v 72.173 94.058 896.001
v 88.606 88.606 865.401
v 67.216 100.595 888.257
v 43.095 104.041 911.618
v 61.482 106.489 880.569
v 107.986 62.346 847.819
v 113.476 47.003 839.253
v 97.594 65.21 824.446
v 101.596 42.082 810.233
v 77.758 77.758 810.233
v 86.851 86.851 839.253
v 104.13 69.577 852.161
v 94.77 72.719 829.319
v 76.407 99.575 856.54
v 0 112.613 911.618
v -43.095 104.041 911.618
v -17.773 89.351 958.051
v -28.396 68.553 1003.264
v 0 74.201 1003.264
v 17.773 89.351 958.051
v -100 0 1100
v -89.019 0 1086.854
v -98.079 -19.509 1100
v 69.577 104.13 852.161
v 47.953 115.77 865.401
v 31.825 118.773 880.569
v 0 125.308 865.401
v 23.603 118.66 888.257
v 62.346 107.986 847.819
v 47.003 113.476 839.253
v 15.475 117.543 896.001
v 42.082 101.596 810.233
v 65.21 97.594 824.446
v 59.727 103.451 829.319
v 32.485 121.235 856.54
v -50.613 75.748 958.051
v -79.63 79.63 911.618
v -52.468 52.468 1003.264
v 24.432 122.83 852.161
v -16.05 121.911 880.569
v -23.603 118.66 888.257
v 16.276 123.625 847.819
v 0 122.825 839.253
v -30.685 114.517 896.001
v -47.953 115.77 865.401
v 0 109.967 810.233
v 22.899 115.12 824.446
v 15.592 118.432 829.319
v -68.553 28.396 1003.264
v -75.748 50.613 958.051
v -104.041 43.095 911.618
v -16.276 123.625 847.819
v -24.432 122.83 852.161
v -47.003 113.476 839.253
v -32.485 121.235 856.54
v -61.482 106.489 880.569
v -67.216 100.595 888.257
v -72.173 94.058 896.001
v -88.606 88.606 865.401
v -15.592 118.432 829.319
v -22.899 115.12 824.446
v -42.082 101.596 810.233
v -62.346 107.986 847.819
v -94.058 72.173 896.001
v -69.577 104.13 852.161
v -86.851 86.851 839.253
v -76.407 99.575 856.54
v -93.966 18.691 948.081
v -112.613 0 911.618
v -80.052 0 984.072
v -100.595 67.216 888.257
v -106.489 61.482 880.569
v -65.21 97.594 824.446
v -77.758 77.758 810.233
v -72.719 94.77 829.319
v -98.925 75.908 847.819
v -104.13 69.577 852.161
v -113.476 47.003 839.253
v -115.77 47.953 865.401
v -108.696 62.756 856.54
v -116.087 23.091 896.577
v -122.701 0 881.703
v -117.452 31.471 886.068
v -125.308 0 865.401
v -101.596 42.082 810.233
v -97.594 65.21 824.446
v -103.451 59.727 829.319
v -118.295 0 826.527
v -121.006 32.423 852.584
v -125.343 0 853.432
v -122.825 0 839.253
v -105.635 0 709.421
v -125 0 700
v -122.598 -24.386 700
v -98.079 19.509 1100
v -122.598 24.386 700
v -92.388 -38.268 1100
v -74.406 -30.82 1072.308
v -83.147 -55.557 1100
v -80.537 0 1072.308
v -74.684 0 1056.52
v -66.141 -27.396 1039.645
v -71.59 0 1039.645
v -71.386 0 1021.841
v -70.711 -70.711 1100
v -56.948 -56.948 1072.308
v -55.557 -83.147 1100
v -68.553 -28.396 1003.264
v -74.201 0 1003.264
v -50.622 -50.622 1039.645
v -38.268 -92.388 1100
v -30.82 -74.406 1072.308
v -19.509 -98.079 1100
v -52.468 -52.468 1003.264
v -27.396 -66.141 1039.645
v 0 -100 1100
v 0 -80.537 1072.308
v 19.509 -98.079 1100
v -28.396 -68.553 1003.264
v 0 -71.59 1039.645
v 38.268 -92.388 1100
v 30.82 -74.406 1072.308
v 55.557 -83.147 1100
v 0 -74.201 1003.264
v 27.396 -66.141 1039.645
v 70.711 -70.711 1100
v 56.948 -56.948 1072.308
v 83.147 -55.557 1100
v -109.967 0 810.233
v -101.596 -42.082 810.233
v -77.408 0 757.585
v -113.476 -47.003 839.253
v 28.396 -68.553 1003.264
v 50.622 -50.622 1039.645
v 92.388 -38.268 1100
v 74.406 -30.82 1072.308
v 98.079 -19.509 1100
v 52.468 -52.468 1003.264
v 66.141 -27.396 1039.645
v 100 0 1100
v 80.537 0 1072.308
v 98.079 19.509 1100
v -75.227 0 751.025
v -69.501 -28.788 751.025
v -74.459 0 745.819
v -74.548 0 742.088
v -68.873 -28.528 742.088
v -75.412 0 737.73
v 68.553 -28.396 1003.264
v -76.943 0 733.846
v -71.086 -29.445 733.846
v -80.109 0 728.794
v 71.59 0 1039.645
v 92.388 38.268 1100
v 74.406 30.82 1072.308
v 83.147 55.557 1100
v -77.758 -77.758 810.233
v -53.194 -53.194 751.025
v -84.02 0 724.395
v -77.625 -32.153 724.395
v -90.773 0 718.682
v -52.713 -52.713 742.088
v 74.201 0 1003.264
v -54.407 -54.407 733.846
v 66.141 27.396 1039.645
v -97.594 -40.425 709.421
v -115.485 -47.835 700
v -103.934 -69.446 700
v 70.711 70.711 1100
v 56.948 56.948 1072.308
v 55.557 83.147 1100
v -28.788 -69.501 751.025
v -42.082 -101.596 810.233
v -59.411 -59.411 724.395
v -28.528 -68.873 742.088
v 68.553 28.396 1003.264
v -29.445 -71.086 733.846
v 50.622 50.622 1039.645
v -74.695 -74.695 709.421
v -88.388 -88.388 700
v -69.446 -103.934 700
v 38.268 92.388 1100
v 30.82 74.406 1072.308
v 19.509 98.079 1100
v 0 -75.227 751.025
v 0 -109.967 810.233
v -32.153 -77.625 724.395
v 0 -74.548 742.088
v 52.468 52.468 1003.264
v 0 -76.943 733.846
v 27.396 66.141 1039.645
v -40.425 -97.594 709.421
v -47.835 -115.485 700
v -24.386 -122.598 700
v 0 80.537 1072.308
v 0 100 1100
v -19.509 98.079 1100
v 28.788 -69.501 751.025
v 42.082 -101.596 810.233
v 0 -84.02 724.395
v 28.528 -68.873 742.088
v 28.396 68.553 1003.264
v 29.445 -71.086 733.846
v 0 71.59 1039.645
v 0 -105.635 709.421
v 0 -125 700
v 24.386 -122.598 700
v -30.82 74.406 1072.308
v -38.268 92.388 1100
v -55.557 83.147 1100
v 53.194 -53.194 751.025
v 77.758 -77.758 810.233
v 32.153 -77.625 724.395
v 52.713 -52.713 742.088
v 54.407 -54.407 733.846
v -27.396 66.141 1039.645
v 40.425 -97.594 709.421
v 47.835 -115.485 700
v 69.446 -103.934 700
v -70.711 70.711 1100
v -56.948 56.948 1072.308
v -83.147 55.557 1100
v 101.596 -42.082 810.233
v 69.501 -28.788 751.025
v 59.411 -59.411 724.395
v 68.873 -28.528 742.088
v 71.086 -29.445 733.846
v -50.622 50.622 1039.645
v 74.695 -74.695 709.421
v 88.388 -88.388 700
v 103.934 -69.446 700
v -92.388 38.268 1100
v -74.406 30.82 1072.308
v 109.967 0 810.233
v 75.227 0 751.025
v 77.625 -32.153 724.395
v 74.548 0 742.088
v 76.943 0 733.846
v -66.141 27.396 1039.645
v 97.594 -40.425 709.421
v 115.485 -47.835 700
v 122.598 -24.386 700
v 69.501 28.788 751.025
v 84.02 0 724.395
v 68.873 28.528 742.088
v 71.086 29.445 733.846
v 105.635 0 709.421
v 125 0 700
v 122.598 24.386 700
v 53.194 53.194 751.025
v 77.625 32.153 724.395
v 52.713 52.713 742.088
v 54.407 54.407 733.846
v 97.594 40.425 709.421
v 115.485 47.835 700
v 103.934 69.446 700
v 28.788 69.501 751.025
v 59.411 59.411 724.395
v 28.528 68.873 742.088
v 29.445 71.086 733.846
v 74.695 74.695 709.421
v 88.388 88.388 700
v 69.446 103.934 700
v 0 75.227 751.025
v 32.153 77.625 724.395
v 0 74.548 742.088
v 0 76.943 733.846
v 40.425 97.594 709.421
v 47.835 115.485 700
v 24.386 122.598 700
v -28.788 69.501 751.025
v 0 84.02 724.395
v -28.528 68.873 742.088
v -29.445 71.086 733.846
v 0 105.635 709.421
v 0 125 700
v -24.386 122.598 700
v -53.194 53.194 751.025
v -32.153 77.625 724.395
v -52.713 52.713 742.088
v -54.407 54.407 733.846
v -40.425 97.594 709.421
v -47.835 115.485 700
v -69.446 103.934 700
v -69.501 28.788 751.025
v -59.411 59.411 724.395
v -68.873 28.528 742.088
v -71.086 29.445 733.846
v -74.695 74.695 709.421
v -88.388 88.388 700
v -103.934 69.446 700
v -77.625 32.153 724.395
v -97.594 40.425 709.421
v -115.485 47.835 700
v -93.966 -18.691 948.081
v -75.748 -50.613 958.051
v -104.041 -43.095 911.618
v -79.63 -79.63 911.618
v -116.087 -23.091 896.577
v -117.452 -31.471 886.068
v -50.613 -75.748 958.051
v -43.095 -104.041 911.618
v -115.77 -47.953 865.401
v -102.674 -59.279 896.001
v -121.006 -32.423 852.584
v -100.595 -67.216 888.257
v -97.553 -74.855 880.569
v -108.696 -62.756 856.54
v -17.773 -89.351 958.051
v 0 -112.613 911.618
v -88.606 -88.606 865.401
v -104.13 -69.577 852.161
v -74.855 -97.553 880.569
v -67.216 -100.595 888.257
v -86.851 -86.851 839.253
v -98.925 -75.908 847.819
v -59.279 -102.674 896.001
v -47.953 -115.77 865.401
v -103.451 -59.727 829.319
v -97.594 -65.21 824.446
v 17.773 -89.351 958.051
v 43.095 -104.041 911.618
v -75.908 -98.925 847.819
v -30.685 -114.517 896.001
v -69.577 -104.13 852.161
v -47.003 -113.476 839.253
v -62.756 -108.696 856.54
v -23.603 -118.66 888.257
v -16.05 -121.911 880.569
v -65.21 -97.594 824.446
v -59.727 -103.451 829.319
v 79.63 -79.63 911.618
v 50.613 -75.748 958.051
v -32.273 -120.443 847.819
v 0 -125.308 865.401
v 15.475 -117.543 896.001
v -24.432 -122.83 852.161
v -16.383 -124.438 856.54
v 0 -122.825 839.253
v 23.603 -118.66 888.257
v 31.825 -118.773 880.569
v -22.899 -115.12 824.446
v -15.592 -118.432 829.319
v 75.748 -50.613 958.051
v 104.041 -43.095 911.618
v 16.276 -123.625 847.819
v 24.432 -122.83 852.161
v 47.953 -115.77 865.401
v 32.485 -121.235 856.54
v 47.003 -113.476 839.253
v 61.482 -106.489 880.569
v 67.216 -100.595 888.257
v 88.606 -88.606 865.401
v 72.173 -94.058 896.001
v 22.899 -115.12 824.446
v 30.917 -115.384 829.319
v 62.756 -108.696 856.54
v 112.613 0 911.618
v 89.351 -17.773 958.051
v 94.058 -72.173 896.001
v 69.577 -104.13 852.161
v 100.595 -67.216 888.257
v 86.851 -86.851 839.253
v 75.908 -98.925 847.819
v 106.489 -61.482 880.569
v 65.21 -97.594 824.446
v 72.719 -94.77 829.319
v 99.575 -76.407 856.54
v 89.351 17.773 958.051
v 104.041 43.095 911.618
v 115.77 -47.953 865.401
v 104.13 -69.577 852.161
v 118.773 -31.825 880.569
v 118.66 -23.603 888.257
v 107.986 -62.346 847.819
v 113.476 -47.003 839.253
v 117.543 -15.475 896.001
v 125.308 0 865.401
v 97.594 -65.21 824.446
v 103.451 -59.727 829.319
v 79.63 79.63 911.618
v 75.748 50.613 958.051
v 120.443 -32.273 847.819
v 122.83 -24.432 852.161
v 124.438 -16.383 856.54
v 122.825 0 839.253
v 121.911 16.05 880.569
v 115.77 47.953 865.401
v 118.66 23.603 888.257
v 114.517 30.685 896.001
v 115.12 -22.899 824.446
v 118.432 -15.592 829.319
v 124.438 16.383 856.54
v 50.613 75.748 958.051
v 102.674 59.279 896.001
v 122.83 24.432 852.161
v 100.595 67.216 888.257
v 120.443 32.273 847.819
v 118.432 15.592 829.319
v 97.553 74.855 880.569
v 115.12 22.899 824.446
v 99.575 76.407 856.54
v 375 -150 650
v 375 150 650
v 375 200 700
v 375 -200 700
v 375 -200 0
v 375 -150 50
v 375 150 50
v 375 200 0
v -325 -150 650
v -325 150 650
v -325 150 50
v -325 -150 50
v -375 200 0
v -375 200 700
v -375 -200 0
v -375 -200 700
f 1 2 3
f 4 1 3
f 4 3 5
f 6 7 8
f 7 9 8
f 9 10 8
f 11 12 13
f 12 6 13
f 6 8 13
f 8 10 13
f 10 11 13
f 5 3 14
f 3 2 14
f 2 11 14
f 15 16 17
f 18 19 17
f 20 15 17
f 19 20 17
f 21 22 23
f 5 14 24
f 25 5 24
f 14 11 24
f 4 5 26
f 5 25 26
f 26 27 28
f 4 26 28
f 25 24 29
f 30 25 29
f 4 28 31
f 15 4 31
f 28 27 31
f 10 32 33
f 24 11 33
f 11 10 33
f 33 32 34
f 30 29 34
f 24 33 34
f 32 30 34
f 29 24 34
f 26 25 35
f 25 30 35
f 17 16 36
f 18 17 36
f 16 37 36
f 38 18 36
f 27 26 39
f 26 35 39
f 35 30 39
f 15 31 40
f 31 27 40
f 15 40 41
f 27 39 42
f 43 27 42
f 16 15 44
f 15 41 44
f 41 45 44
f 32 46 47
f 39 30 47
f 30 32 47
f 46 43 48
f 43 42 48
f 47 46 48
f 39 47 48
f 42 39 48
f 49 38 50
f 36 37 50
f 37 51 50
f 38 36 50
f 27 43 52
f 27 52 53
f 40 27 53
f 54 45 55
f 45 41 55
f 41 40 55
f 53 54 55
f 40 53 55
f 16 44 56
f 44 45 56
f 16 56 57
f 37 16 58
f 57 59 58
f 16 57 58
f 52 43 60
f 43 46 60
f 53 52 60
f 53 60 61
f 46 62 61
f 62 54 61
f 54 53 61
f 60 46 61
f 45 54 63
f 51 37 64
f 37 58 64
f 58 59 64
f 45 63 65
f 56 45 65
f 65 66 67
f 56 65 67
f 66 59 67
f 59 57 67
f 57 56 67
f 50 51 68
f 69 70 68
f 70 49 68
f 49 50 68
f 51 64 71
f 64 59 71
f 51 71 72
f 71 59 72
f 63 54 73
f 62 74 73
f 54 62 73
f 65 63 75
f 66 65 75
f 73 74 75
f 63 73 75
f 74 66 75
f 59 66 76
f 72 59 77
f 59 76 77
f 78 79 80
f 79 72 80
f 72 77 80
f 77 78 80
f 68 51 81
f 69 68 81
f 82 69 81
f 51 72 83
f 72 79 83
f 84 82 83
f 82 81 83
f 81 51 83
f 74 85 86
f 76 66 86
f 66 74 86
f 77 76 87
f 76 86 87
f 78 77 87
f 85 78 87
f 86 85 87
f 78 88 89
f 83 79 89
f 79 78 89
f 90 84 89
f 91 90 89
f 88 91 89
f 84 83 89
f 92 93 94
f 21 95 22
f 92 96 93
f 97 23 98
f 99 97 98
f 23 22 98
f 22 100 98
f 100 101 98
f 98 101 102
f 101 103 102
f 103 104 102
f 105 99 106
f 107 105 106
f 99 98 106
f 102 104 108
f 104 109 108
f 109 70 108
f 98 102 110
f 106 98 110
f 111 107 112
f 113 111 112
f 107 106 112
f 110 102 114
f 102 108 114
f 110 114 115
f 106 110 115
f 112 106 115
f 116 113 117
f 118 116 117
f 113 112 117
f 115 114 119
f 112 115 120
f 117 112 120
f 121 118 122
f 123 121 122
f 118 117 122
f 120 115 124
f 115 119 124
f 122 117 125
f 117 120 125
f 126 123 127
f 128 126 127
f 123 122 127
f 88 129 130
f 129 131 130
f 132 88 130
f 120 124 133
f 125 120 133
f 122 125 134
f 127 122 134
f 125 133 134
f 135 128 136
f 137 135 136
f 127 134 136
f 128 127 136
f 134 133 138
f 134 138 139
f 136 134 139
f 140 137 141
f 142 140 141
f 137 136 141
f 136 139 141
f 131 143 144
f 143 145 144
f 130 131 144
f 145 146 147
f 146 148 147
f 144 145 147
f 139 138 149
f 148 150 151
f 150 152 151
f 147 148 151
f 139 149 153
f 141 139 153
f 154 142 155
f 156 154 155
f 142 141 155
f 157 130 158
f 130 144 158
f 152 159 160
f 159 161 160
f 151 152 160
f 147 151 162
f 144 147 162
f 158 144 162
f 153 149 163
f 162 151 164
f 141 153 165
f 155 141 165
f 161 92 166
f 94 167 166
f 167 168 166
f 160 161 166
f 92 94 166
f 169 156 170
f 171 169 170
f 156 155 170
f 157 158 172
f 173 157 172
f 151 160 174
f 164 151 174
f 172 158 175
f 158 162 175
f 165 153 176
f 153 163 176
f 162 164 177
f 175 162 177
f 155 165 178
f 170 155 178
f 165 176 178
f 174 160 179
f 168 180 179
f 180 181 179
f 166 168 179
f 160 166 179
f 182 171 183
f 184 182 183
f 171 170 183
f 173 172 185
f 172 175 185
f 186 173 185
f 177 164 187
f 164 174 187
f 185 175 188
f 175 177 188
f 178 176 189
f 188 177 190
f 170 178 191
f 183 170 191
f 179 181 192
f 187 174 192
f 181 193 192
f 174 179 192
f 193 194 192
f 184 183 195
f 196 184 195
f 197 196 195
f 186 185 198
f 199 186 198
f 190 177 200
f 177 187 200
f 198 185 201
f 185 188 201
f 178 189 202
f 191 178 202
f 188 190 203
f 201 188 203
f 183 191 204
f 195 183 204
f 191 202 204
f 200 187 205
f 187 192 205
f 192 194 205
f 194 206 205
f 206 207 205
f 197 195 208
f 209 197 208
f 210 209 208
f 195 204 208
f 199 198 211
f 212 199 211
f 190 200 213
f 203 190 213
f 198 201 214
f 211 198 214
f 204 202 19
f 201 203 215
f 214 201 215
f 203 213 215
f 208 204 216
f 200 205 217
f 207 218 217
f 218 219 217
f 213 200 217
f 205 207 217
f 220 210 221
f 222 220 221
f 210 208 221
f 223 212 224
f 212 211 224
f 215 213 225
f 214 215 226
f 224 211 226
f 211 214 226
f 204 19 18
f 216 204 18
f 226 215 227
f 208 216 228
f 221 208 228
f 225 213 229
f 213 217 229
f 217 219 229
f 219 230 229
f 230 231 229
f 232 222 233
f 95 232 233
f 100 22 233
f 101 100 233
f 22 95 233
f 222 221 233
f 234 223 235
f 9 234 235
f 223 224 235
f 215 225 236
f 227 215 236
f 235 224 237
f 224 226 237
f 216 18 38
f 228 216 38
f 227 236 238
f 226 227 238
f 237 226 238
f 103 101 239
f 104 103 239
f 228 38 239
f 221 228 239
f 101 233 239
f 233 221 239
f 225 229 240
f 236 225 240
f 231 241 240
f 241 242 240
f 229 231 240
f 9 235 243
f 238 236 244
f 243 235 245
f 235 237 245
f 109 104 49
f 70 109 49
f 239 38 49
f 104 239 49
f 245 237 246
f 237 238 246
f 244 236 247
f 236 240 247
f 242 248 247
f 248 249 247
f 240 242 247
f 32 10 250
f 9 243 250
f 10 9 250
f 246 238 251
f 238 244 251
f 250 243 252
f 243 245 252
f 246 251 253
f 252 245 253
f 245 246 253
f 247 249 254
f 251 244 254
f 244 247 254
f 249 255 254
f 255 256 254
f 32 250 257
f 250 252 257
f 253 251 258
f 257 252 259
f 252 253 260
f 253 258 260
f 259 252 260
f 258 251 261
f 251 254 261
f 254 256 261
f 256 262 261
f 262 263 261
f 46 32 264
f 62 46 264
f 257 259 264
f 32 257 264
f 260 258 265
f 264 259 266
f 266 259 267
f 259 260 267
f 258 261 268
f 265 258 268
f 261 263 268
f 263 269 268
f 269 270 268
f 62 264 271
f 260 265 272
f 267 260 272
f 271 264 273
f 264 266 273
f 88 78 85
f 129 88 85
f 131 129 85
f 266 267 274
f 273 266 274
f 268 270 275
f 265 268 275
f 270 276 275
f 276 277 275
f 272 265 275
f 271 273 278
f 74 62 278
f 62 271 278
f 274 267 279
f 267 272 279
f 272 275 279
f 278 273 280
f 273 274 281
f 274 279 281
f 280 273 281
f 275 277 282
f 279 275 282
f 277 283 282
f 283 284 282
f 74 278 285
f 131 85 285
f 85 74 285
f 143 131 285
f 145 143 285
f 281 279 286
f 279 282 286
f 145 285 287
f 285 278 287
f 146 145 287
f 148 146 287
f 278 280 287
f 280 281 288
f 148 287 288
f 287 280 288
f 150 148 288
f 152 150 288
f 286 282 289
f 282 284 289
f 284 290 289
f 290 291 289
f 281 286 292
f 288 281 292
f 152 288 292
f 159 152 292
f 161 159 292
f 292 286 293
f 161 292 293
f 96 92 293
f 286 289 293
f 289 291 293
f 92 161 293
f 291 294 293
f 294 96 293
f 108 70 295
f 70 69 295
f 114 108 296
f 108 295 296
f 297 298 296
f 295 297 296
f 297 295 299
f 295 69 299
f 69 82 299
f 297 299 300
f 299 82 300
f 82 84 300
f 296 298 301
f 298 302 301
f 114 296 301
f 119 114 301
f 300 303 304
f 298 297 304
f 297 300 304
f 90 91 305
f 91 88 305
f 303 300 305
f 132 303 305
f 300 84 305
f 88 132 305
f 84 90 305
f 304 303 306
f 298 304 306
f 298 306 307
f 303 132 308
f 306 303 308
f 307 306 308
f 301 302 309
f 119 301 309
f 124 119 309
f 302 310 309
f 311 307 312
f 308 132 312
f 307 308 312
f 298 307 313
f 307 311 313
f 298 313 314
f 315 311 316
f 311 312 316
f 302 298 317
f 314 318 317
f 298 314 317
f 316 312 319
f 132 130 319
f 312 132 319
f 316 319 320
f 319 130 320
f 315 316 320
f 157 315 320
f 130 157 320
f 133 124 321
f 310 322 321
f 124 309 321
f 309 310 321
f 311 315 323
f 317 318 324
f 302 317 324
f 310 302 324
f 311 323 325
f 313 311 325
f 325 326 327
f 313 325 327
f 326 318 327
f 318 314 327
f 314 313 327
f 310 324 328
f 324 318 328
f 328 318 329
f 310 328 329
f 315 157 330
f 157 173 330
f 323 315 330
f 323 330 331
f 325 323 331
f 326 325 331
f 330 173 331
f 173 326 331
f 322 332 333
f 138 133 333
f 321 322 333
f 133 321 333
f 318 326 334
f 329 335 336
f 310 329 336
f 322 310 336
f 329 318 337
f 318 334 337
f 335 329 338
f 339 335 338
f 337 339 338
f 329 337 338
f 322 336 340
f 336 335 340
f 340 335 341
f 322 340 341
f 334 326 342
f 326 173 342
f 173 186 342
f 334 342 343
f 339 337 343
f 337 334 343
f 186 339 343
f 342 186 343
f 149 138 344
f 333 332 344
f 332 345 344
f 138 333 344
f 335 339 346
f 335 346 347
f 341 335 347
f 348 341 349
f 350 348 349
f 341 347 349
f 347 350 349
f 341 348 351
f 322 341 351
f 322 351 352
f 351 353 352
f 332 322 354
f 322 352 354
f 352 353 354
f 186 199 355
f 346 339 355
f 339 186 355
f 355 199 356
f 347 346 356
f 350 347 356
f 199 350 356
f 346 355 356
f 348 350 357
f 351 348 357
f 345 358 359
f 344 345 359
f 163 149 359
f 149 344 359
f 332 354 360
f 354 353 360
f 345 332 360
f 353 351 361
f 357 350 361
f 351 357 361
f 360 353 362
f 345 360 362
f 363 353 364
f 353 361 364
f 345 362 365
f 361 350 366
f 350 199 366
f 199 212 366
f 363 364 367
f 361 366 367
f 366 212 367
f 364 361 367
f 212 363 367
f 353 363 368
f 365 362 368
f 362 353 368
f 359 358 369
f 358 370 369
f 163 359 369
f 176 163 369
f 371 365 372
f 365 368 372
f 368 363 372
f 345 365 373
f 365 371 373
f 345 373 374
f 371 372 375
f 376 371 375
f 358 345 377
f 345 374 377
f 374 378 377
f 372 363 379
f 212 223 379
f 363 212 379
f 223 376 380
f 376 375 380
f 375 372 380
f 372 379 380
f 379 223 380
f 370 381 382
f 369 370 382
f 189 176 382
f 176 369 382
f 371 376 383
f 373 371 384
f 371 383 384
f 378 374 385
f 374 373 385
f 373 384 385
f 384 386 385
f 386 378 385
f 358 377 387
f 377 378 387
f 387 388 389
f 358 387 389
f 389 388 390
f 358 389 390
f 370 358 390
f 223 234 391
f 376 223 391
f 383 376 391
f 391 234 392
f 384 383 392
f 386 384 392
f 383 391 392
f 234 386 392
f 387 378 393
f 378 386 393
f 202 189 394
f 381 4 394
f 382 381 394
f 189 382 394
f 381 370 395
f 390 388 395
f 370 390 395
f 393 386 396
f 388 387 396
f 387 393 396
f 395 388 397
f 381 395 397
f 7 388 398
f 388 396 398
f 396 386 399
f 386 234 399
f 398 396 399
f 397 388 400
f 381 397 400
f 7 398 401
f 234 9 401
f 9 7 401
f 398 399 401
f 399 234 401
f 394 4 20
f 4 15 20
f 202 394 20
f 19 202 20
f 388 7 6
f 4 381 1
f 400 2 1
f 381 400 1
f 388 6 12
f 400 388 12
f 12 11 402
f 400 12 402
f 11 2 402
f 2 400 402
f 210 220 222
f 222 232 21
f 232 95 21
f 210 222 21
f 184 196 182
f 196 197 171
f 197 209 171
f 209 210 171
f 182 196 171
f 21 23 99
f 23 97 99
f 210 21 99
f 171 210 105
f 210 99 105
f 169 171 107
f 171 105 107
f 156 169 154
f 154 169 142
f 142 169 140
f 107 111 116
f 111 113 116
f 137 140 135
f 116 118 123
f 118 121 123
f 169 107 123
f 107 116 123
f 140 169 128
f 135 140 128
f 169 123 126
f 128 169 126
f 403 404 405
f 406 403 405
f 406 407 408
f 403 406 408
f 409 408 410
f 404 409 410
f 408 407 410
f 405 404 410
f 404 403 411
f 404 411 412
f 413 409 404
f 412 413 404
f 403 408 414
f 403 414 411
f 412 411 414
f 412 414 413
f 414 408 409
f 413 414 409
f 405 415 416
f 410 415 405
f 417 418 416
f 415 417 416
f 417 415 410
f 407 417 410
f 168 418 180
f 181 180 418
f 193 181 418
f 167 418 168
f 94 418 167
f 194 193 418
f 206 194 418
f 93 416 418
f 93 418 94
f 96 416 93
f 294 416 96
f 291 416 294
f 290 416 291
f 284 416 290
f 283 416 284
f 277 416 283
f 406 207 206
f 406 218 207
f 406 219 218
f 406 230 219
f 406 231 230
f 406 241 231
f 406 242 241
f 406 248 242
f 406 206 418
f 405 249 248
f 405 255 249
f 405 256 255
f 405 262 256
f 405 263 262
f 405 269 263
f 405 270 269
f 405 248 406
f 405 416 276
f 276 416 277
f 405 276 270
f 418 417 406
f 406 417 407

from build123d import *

# Parameters (mm, degrees)
F0_W     = 750
F0_H     = 400
F1_DEPTH = 700
F2_W     = 300
F2_H     = 600
F3_DEPTH = 700


with BuildPart() as f1:
    # F0 (on Top) → F1 (new body)
    with BuildSketch(Plane.XY):
        Rectangle(F0_W, F0_H)
    extrude(amount=F1_DEPTH)

    # F2 (on face) → F3 (cut, through all)
    with BuildSketch(Plane.YZ.offset(375)):
        with Locations((0, 350)):
            Rectangle(F2_W, F2_H)
    extrude(amount=-F3_DEPTH, mode=Mode.SUBTRACT)

    # F4 (on Front) → F5 (revolve)
    with BuildSketch(Plane.XZ):
        with BuildLine():
            Line((0, 1100), (-100, 1100))
            add(Edge.make_bspline(
                [(-100, 1100), (-74.9264732003, 1074.5007991791), (-52.4668861873, 995.3000976798), (-167.4321274896, 851.7977207352), (-48.4324080123, 747.3342060696), (-88.7868594089, 716.1834569746), (-125, 700)],
                knots=[0, 0, 0, 0, 0.2434136268, 0.5448860938, 0.7983932105, 1, 1, 1, 1], degree=3))
            Line((-125, 700), (0, 700))
            Line((0, 700), (0, 1100))
        make_face()
    revolve(axis=Axis((0, 0, 550), (0, 0, 1)))


solid = f1.part
